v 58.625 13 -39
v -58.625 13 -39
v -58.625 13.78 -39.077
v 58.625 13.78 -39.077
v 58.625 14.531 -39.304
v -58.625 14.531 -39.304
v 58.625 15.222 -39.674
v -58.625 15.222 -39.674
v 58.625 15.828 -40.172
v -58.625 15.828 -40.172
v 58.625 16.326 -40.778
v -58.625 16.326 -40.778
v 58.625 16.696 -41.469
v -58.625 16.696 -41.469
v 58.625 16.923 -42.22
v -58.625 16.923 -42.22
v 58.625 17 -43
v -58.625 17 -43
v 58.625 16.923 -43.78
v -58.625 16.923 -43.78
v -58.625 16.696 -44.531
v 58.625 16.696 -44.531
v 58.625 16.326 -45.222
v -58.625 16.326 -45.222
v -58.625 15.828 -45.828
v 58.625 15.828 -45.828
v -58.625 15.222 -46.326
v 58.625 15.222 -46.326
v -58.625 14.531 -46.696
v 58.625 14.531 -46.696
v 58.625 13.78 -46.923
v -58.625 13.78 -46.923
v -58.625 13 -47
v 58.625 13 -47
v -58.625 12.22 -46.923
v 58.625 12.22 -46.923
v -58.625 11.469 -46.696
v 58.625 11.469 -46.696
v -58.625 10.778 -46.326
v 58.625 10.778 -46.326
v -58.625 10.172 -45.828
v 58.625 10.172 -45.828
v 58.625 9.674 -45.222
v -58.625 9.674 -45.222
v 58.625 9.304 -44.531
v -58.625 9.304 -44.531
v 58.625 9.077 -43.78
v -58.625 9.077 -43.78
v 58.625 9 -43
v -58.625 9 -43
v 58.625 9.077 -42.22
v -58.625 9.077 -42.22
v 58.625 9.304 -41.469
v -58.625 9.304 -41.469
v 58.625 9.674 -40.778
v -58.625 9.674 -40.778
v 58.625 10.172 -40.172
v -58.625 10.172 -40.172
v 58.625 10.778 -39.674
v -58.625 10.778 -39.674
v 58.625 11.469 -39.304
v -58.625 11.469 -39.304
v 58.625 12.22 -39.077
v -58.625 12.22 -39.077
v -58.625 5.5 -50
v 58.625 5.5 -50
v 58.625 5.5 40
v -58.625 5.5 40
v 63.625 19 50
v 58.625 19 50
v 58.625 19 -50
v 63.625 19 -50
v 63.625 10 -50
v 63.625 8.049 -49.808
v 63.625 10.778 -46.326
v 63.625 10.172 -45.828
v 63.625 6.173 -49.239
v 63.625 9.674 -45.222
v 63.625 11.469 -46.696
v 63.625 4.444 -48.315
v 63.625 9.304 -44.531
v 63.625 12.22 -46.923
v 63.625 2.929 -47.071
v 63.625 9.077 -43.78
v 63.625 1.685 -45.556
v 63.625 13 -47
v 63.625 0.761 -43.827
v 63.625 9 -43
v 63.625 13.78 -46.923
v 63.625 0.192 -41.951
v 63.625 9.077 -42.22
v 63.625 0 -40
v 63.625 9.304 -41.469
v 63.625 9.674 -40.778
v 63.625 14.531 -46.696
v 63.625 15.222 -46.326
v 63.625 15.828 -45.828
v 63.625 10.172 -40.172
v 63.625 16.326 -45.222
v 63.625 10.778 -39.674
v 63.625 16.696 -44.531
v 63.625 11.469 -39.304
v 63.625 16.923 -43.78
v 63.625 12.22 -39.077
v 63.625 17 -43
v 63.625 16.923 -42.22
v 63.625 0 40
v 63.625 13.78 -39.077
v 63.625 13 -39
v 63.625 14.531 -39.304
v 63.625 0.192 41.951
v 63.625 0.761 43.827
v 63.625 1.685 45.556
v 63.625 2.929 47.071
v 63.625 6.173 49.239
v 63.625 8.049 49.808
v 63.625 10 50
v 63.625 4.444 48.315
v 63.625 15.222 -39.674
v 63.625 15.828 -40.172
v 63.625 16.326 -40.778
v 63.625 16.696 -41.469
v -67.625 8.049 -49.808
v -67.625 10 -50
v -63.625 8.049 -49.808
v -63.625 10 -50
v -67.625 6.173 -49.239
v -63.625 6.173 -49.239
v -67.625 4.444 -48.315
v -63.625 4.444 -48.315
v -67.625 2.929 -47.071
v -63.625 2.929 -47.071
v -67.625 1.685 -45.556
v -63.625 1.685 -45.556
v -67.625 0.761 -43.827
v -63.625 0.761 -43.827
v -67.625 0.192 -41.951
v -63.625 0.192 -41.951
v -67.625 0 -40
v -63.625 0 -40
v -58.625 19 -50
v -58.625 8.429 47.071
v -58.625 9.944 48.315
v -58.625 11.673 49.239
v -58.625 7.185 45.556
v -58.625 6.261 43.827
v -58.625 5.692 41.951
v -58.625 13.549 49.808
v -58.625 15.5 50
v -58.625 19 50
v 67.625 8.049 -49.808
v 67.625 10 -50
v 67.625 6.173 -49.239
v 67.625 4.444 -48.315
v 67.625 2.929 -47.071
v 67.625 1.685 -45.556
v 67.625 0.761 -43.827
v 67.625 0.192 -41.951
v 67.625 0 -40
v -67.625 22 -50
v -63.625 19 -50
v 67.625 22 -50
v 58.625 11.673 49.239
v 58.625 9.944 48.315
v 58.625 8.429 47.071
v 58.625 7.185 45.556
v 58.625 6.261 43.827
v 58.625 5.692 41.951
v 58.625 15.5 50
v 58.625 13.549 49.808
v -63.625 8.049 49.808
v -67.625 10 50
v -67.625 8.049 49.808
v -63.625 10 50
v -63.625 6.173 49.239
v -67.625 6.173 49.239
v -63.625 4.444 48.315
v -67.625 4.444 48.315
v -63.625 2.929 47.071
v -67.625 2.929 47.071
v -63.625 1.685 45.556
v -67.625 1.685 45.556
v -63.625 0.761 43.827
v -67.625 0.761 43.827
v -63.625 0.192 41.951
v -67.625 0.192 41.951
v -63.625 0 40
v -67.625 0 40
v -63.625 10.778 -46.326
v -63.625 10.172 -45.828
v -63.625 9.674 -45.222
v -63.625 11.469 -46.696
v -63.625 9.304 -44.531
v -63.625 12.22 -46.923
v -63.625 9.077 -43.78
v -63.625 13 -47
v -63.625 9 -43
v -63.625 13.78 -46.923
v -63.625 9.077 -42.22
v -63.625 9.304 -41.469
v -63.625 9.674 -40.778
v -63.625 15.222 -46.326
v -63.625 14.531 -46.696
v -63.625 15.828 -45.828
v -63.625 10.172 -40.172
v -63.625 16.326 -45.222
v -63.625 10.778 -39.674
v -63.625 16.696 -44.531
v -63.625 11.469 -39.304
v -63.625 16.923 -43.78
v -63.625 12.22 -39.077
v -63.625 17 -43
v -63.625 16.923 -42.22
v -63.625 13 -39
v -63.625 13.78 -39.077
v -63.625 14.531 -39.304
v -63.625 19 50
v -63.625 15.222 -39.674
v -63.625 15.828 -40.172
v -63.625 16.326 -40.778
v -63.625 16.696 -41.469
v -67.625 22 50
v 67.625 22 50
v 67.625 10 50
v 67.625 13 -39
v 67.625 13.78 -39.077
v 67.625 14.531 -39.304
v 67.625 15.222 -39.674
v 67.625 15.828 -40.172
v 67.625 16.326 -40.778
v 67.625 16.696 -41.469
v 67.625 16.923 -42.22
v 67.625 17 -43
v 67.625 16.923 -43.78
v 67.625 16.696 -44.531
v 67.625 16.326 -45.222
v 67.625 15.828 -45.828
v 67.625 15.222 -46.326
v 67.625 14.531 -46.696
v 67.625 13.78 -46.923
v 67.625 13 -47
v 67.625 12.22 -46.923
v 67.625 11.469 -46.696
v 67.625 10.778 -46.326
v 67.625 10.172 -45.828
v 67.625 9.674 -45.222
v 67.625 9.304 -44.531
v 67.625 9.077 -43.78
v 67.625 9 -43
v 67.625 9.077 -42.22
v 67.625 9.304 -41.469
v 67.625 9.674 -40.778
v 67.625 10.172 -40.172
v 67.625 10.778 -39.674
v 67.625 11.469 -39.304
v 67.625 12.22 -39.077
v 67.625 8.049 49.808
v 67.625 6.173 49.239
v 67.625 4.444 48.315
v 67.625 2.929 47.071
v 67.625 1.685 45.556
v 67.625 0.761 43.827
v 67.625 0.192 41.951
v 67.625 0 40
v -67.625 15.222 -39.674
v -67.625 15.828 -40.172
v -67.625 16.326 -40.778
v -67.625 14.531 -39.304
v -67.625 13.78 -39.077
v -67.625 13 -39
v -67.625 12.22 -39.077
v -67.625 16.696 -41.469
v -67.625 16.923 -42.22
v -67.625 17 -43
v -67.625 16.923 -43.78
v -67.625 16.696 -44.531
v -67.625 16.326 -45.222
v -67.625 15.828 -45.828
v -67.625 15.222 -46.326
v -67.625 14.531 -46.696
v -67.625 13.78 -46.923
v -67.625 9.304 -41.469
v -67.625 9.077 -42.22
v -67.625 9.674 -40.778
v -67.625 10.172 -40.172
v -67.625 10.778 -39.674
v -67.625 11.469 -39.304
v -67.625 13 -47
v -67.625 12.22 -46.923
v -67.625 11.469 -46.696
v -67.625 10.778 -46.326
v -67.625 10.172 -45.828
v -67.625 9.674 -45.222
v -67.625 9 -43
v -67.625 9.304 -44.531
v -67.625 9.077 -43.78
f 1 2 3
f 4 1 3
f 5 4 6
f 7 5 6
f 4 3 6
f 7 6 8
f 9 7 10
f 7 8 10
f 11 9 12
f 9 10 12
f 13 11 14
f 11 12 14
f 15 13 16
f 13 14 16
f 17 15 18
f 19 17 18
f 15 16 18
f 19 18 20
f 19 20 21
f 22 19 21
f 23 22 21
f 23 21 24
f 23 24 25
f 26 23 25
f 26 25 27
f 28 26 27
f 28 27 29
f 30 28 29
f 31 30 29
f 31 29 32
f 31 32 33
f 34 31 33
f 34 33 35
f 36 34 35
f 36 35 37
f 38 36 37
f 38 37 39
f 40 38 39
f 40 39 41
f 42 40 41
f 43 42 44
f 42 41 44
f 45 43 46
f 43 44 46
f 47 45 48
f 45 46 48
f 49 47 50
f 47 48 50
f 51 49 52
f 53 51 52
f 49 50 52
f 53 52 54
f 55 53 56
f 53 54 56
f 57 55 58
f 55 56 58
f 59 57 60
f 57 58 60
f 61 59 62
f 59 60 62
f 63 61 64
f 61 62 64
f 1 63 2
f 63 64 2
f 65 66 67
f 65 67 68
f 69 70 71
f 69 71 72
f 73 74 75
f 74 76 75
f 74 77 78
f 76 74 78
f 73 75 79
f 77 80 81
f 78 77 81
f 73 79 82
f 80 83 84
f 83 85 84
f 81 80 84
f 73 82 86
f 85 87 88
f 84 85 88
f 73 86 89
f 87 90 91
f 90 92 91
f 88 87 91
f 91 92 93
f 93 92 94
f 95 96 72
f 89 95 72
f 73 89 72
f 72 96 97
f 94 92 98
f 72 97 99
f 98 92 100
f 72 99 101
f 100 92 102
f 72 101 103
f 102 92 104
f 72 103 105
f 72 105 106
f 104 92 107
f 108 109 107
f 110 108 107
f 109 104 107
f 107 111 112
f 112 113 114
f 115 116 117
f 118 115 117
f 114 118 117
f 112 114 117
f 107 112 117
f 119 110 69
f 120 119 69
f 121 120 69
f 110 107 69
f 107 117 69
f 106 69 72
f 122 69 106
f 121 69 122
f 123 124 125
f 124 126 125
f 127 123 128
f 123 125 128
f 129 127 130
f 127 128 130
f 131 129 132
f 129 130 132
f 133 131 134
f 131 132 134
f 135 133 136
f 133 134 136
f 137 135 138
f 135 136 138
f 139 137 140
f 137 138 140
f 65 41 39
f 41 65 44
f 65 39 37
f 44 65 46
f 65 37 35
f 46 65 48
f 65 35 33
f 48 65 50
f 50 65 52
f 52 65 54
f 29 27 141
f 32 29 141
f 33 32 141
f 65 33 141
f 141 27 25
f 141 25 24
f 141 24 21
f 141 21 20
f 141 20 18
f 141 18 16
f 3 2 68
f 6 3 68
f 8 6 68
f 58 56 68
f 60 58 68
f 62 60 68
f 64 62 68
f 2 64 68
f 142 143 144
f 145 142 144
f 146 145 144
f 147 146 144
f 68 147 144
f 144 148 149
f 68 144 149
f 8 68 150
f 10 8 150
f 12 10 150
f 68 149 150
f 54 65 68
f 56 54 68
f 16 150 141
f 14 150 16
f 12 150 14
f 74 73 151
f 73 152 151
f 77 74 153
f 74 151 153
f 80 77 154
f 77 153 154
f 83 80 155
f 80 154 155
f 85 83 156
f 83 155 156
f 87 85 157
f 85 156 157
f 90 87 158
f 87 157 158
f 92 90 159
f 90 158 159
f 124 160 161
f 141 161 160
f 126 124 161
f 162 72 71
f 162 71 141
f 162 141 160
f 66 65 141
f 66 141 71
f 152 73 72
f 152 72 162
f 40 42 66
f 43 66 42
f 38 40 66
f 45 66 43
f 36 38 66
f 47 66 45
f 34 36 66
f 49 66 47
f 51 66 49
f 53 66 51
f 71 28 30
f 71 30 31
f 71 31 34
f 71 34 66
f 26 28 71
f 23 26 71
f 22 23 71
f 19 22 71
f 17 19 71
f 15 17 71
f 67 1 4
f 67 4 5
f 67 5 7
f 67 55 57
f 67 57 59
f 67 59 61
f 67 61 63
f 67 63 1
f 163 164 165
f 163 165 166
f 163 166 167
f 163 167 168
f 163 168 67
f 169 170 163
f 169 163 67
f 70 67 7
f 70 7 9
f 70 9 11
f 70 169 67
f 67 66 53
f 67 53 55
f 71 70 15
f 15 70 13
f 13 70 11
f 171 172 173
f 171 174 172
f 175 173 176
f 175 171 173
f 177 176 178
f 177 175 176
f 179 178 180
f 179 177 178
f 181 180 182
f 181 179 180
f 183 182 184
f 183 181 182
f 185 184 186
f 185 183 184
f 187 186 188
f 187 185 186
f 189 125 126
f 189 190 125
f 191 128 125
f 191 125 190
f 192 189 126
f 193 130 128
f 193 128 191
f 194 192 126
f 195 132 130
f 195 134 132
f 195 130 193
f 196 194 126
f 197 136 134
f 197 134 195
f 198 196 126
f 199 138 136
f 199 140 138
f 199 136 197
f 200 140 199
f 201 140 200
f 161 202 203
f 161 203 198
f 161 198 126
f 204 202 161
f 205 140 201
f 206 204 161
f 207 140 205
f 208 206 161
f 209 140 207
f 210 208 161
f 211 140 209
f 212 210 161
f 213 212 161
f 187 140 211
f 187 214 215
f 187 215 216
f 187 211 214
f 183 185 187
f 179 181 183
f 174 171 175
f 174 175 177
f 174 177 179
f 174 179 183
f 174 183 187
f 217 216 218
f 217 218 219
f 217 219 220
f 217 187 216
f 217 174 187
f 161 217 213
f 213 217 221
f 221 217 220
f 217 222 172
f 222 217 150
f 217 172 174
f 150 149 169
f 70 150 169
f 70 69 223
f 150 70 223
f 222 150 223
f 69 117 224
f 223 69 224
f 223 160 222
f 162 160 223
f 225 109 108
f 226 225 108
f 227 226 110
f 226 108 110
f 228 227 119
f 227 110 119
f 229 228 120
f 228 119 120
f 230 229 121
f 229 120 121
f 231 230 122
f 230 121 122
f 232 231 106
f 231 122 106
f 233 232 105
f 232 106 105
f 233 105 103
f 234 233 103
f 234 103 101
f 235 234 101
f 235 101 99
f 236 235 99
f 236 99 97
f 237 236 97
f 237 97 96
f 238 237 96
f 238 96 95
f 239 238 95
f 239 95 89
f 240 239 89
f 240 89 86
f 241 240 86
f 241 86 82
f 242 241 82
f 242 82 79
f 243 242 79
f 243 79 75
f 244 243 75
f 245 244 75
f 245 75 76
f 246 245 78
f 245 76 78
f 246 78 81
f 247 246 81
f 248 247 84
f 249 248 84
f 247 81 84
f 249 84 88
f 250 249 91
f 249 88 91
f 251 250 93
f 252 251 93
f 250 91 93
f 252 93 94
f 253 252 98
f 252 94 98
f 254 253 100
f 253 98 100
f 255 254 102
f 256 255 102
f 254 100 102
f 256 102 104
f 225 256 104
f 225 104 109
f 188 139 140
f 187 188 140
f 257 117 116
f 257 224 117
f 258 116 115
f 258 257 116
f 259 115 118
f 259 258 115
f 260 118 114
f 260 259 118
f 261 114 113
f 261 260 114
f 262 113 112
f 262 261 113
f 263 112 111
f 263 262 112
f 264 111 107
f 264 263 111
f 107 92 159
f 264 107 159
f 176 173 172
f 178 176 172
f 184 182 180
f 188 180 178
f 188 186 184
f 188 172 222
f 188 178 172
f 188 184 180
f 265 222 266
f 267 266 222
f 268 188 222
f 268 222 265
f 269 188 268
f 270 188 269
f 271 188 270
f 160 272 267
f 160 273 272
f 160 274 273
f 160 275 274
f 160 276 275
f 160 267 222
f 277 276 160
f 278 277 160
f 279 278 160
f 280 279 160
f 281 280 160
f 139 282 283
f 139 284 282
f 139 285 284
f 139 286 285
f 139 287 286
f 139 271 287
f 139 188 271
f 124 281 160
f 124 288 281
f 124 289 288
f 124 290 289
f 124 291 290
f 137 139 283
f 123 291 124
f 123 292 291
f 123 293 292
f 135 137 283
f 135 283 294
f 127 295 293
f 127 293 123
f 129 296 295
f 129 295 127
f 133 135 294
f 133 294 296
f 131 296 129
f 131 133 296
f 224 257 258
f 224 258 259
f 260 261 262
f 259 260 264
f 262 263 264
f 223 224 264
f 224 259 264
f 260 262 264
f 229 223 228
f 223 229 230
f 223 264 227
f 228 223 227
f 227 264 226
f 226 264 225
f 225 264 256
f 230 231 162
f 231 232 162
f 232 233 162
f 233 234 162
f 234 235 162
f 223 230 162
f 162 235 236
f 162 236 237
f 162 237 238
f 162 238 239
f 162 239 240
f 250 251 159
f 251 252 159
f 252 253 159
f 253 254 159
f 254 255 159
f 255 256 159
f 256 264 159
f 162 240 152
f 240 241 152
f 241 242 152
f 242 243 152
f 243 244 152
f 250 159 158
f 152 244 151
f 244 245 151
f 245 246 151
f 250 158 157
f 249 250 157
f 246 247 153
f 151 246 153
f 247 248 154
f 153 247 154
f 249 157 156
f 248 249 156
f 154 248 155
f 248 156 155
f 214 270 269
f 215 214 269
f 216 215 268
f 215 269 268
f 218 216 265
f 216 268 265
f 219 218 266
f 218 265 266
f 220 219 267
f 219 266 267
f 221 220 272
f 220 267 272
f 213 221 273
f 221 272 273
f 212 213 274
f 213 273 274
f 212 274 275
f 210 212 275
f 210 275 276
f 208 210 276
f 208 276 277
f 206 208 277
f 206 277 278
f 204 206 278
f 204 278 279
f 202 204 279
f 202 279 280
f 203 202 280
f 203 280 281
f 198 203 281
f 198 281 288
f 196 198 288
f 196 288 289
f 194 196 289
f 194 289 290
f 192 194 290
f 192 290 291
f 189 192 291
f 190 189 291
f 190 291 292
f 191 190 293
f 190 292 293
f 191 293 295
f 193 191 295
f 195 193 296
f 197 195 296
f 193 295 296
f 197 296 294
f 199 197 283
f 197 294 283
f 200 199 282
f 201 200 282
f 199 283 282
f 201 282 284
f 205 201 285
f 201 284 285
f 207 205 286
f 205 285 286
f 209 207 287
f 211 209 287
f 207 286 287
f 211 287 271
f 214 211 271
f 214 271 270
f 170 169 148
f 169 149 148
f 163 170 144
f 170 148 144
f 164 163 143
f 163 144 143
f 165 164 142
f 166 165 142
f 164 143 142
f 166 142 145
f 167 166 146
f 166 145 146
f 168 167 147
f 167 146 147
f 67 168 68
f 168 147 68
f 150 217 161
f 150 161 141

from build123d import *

# Parameters (mm, degrees)
SKETCH1_W           = 135.25
SKETCH1_H           = 100
BOSS_EXTRUDE1_DEPTH = 22
SKETCH4_W           = 5
SKETCH4_H           = 19
CUT_EXTRUDE1_DEPTH  = 101
SKETCH5_W           = 117.25
SKETCH5_H           = 11
CUT_EXTRUDE2_DEPTH  = 101
FILLET1_R           = 10
FILLET2_R           = 10
FILLET3_R           = 10
FILLET4_R           = 10
FILLET5_R           = 10
SKETCH6_R           = 4
CUT_EXTRUDE3_DEPTH  = 136.25


with BuildPart() as part:
    # Sketch1 → Boss-Extrude1 (new body)
    with BuildSketch(Plane(origin=(0, 0, 0), x_dir=(1, 0, 0), z_dir=(0, 1, 0))):
        Rectangle(SKETCH1_W, SKETCH1_H)
    extrude(amount=BOSS_EXTRUDE1_DEPTH)

    # Sketch4 → Cut-Extrude1 (cut, through all)
    with BuildSketch(Plane.XY.offset(50)):
        with Locations((-61.125, 9.5)):
            Rectangle(SKETCH4_W, SKETCH4_H)
        with Locations((61.125, 9.5)):
            Rectangle(SKETCH4_W, SKETCH4_H)
    extrude(amount=-CUT_EXTRUDE1_DEPTH, mode=Mode.SUBTRACT)

    # Sketch5 → Cut-Extrude2 (cut, through all)
    with BuildSketch(Plane(origin=(0, 0, -50), x_dir=(-1, 0, 0), z_dir=(0, 0, -1))):
        Rectangle(SKETCH5_W, SKETCH5_H)
    extrude(amount=-CUT_EXTRUDE2_DEPTH, mode=Mode.SUBTRACT)

    # Fillet1
    fillet1_edges = [part.edges().sort_by_distance(p)[0] for p in [
        (0, 5.5, 50),
    ]]
    fillet(fillet1_edges, radius=FILLET1_R)

    # Fillet2
    fillet2_edges = [part.edges().sort_by_distance(p)[0] for p in [
        (-65.625, 0, 50),
    ]]
    fillet(fillet2_edges, radius=FILLET2_R)

    # Fillet3
    fillet3_edges = [part.edges().sort_by_distance(p)[0] for p in [
        (65.625, 0, 50),
    ]]
    fillet(fillet3_edges, radius=FILLET3_R)

    # Fillet4
    fillet4_edges = [part.edges().sort_by_distance(p)[0] for p in [
        (-65.625, 0, -50),
    ]]
    fillet(fillet4_edges, radius=FILLET4_R)

    # Fillet5
    fillet5_edges = [part.edges().sort_by_distance(p)[0] for p in [
        (65.625, 0, -50),
    ]]
    fillet(fillet5_edges, radius=FILLET5_R)

    # Sketch6 → Cut-Extrude3 (cut, through all)
    with BuildSketch(Plane.ZY.offset(67.625)):
        with Locations((-43, 13)):
            Circle(SKETCH6_R)
    extrude(amount=-CUT_EXTRUDE3_DEPTH, mode=Mode.SUBTRACT)


solid = part.part
